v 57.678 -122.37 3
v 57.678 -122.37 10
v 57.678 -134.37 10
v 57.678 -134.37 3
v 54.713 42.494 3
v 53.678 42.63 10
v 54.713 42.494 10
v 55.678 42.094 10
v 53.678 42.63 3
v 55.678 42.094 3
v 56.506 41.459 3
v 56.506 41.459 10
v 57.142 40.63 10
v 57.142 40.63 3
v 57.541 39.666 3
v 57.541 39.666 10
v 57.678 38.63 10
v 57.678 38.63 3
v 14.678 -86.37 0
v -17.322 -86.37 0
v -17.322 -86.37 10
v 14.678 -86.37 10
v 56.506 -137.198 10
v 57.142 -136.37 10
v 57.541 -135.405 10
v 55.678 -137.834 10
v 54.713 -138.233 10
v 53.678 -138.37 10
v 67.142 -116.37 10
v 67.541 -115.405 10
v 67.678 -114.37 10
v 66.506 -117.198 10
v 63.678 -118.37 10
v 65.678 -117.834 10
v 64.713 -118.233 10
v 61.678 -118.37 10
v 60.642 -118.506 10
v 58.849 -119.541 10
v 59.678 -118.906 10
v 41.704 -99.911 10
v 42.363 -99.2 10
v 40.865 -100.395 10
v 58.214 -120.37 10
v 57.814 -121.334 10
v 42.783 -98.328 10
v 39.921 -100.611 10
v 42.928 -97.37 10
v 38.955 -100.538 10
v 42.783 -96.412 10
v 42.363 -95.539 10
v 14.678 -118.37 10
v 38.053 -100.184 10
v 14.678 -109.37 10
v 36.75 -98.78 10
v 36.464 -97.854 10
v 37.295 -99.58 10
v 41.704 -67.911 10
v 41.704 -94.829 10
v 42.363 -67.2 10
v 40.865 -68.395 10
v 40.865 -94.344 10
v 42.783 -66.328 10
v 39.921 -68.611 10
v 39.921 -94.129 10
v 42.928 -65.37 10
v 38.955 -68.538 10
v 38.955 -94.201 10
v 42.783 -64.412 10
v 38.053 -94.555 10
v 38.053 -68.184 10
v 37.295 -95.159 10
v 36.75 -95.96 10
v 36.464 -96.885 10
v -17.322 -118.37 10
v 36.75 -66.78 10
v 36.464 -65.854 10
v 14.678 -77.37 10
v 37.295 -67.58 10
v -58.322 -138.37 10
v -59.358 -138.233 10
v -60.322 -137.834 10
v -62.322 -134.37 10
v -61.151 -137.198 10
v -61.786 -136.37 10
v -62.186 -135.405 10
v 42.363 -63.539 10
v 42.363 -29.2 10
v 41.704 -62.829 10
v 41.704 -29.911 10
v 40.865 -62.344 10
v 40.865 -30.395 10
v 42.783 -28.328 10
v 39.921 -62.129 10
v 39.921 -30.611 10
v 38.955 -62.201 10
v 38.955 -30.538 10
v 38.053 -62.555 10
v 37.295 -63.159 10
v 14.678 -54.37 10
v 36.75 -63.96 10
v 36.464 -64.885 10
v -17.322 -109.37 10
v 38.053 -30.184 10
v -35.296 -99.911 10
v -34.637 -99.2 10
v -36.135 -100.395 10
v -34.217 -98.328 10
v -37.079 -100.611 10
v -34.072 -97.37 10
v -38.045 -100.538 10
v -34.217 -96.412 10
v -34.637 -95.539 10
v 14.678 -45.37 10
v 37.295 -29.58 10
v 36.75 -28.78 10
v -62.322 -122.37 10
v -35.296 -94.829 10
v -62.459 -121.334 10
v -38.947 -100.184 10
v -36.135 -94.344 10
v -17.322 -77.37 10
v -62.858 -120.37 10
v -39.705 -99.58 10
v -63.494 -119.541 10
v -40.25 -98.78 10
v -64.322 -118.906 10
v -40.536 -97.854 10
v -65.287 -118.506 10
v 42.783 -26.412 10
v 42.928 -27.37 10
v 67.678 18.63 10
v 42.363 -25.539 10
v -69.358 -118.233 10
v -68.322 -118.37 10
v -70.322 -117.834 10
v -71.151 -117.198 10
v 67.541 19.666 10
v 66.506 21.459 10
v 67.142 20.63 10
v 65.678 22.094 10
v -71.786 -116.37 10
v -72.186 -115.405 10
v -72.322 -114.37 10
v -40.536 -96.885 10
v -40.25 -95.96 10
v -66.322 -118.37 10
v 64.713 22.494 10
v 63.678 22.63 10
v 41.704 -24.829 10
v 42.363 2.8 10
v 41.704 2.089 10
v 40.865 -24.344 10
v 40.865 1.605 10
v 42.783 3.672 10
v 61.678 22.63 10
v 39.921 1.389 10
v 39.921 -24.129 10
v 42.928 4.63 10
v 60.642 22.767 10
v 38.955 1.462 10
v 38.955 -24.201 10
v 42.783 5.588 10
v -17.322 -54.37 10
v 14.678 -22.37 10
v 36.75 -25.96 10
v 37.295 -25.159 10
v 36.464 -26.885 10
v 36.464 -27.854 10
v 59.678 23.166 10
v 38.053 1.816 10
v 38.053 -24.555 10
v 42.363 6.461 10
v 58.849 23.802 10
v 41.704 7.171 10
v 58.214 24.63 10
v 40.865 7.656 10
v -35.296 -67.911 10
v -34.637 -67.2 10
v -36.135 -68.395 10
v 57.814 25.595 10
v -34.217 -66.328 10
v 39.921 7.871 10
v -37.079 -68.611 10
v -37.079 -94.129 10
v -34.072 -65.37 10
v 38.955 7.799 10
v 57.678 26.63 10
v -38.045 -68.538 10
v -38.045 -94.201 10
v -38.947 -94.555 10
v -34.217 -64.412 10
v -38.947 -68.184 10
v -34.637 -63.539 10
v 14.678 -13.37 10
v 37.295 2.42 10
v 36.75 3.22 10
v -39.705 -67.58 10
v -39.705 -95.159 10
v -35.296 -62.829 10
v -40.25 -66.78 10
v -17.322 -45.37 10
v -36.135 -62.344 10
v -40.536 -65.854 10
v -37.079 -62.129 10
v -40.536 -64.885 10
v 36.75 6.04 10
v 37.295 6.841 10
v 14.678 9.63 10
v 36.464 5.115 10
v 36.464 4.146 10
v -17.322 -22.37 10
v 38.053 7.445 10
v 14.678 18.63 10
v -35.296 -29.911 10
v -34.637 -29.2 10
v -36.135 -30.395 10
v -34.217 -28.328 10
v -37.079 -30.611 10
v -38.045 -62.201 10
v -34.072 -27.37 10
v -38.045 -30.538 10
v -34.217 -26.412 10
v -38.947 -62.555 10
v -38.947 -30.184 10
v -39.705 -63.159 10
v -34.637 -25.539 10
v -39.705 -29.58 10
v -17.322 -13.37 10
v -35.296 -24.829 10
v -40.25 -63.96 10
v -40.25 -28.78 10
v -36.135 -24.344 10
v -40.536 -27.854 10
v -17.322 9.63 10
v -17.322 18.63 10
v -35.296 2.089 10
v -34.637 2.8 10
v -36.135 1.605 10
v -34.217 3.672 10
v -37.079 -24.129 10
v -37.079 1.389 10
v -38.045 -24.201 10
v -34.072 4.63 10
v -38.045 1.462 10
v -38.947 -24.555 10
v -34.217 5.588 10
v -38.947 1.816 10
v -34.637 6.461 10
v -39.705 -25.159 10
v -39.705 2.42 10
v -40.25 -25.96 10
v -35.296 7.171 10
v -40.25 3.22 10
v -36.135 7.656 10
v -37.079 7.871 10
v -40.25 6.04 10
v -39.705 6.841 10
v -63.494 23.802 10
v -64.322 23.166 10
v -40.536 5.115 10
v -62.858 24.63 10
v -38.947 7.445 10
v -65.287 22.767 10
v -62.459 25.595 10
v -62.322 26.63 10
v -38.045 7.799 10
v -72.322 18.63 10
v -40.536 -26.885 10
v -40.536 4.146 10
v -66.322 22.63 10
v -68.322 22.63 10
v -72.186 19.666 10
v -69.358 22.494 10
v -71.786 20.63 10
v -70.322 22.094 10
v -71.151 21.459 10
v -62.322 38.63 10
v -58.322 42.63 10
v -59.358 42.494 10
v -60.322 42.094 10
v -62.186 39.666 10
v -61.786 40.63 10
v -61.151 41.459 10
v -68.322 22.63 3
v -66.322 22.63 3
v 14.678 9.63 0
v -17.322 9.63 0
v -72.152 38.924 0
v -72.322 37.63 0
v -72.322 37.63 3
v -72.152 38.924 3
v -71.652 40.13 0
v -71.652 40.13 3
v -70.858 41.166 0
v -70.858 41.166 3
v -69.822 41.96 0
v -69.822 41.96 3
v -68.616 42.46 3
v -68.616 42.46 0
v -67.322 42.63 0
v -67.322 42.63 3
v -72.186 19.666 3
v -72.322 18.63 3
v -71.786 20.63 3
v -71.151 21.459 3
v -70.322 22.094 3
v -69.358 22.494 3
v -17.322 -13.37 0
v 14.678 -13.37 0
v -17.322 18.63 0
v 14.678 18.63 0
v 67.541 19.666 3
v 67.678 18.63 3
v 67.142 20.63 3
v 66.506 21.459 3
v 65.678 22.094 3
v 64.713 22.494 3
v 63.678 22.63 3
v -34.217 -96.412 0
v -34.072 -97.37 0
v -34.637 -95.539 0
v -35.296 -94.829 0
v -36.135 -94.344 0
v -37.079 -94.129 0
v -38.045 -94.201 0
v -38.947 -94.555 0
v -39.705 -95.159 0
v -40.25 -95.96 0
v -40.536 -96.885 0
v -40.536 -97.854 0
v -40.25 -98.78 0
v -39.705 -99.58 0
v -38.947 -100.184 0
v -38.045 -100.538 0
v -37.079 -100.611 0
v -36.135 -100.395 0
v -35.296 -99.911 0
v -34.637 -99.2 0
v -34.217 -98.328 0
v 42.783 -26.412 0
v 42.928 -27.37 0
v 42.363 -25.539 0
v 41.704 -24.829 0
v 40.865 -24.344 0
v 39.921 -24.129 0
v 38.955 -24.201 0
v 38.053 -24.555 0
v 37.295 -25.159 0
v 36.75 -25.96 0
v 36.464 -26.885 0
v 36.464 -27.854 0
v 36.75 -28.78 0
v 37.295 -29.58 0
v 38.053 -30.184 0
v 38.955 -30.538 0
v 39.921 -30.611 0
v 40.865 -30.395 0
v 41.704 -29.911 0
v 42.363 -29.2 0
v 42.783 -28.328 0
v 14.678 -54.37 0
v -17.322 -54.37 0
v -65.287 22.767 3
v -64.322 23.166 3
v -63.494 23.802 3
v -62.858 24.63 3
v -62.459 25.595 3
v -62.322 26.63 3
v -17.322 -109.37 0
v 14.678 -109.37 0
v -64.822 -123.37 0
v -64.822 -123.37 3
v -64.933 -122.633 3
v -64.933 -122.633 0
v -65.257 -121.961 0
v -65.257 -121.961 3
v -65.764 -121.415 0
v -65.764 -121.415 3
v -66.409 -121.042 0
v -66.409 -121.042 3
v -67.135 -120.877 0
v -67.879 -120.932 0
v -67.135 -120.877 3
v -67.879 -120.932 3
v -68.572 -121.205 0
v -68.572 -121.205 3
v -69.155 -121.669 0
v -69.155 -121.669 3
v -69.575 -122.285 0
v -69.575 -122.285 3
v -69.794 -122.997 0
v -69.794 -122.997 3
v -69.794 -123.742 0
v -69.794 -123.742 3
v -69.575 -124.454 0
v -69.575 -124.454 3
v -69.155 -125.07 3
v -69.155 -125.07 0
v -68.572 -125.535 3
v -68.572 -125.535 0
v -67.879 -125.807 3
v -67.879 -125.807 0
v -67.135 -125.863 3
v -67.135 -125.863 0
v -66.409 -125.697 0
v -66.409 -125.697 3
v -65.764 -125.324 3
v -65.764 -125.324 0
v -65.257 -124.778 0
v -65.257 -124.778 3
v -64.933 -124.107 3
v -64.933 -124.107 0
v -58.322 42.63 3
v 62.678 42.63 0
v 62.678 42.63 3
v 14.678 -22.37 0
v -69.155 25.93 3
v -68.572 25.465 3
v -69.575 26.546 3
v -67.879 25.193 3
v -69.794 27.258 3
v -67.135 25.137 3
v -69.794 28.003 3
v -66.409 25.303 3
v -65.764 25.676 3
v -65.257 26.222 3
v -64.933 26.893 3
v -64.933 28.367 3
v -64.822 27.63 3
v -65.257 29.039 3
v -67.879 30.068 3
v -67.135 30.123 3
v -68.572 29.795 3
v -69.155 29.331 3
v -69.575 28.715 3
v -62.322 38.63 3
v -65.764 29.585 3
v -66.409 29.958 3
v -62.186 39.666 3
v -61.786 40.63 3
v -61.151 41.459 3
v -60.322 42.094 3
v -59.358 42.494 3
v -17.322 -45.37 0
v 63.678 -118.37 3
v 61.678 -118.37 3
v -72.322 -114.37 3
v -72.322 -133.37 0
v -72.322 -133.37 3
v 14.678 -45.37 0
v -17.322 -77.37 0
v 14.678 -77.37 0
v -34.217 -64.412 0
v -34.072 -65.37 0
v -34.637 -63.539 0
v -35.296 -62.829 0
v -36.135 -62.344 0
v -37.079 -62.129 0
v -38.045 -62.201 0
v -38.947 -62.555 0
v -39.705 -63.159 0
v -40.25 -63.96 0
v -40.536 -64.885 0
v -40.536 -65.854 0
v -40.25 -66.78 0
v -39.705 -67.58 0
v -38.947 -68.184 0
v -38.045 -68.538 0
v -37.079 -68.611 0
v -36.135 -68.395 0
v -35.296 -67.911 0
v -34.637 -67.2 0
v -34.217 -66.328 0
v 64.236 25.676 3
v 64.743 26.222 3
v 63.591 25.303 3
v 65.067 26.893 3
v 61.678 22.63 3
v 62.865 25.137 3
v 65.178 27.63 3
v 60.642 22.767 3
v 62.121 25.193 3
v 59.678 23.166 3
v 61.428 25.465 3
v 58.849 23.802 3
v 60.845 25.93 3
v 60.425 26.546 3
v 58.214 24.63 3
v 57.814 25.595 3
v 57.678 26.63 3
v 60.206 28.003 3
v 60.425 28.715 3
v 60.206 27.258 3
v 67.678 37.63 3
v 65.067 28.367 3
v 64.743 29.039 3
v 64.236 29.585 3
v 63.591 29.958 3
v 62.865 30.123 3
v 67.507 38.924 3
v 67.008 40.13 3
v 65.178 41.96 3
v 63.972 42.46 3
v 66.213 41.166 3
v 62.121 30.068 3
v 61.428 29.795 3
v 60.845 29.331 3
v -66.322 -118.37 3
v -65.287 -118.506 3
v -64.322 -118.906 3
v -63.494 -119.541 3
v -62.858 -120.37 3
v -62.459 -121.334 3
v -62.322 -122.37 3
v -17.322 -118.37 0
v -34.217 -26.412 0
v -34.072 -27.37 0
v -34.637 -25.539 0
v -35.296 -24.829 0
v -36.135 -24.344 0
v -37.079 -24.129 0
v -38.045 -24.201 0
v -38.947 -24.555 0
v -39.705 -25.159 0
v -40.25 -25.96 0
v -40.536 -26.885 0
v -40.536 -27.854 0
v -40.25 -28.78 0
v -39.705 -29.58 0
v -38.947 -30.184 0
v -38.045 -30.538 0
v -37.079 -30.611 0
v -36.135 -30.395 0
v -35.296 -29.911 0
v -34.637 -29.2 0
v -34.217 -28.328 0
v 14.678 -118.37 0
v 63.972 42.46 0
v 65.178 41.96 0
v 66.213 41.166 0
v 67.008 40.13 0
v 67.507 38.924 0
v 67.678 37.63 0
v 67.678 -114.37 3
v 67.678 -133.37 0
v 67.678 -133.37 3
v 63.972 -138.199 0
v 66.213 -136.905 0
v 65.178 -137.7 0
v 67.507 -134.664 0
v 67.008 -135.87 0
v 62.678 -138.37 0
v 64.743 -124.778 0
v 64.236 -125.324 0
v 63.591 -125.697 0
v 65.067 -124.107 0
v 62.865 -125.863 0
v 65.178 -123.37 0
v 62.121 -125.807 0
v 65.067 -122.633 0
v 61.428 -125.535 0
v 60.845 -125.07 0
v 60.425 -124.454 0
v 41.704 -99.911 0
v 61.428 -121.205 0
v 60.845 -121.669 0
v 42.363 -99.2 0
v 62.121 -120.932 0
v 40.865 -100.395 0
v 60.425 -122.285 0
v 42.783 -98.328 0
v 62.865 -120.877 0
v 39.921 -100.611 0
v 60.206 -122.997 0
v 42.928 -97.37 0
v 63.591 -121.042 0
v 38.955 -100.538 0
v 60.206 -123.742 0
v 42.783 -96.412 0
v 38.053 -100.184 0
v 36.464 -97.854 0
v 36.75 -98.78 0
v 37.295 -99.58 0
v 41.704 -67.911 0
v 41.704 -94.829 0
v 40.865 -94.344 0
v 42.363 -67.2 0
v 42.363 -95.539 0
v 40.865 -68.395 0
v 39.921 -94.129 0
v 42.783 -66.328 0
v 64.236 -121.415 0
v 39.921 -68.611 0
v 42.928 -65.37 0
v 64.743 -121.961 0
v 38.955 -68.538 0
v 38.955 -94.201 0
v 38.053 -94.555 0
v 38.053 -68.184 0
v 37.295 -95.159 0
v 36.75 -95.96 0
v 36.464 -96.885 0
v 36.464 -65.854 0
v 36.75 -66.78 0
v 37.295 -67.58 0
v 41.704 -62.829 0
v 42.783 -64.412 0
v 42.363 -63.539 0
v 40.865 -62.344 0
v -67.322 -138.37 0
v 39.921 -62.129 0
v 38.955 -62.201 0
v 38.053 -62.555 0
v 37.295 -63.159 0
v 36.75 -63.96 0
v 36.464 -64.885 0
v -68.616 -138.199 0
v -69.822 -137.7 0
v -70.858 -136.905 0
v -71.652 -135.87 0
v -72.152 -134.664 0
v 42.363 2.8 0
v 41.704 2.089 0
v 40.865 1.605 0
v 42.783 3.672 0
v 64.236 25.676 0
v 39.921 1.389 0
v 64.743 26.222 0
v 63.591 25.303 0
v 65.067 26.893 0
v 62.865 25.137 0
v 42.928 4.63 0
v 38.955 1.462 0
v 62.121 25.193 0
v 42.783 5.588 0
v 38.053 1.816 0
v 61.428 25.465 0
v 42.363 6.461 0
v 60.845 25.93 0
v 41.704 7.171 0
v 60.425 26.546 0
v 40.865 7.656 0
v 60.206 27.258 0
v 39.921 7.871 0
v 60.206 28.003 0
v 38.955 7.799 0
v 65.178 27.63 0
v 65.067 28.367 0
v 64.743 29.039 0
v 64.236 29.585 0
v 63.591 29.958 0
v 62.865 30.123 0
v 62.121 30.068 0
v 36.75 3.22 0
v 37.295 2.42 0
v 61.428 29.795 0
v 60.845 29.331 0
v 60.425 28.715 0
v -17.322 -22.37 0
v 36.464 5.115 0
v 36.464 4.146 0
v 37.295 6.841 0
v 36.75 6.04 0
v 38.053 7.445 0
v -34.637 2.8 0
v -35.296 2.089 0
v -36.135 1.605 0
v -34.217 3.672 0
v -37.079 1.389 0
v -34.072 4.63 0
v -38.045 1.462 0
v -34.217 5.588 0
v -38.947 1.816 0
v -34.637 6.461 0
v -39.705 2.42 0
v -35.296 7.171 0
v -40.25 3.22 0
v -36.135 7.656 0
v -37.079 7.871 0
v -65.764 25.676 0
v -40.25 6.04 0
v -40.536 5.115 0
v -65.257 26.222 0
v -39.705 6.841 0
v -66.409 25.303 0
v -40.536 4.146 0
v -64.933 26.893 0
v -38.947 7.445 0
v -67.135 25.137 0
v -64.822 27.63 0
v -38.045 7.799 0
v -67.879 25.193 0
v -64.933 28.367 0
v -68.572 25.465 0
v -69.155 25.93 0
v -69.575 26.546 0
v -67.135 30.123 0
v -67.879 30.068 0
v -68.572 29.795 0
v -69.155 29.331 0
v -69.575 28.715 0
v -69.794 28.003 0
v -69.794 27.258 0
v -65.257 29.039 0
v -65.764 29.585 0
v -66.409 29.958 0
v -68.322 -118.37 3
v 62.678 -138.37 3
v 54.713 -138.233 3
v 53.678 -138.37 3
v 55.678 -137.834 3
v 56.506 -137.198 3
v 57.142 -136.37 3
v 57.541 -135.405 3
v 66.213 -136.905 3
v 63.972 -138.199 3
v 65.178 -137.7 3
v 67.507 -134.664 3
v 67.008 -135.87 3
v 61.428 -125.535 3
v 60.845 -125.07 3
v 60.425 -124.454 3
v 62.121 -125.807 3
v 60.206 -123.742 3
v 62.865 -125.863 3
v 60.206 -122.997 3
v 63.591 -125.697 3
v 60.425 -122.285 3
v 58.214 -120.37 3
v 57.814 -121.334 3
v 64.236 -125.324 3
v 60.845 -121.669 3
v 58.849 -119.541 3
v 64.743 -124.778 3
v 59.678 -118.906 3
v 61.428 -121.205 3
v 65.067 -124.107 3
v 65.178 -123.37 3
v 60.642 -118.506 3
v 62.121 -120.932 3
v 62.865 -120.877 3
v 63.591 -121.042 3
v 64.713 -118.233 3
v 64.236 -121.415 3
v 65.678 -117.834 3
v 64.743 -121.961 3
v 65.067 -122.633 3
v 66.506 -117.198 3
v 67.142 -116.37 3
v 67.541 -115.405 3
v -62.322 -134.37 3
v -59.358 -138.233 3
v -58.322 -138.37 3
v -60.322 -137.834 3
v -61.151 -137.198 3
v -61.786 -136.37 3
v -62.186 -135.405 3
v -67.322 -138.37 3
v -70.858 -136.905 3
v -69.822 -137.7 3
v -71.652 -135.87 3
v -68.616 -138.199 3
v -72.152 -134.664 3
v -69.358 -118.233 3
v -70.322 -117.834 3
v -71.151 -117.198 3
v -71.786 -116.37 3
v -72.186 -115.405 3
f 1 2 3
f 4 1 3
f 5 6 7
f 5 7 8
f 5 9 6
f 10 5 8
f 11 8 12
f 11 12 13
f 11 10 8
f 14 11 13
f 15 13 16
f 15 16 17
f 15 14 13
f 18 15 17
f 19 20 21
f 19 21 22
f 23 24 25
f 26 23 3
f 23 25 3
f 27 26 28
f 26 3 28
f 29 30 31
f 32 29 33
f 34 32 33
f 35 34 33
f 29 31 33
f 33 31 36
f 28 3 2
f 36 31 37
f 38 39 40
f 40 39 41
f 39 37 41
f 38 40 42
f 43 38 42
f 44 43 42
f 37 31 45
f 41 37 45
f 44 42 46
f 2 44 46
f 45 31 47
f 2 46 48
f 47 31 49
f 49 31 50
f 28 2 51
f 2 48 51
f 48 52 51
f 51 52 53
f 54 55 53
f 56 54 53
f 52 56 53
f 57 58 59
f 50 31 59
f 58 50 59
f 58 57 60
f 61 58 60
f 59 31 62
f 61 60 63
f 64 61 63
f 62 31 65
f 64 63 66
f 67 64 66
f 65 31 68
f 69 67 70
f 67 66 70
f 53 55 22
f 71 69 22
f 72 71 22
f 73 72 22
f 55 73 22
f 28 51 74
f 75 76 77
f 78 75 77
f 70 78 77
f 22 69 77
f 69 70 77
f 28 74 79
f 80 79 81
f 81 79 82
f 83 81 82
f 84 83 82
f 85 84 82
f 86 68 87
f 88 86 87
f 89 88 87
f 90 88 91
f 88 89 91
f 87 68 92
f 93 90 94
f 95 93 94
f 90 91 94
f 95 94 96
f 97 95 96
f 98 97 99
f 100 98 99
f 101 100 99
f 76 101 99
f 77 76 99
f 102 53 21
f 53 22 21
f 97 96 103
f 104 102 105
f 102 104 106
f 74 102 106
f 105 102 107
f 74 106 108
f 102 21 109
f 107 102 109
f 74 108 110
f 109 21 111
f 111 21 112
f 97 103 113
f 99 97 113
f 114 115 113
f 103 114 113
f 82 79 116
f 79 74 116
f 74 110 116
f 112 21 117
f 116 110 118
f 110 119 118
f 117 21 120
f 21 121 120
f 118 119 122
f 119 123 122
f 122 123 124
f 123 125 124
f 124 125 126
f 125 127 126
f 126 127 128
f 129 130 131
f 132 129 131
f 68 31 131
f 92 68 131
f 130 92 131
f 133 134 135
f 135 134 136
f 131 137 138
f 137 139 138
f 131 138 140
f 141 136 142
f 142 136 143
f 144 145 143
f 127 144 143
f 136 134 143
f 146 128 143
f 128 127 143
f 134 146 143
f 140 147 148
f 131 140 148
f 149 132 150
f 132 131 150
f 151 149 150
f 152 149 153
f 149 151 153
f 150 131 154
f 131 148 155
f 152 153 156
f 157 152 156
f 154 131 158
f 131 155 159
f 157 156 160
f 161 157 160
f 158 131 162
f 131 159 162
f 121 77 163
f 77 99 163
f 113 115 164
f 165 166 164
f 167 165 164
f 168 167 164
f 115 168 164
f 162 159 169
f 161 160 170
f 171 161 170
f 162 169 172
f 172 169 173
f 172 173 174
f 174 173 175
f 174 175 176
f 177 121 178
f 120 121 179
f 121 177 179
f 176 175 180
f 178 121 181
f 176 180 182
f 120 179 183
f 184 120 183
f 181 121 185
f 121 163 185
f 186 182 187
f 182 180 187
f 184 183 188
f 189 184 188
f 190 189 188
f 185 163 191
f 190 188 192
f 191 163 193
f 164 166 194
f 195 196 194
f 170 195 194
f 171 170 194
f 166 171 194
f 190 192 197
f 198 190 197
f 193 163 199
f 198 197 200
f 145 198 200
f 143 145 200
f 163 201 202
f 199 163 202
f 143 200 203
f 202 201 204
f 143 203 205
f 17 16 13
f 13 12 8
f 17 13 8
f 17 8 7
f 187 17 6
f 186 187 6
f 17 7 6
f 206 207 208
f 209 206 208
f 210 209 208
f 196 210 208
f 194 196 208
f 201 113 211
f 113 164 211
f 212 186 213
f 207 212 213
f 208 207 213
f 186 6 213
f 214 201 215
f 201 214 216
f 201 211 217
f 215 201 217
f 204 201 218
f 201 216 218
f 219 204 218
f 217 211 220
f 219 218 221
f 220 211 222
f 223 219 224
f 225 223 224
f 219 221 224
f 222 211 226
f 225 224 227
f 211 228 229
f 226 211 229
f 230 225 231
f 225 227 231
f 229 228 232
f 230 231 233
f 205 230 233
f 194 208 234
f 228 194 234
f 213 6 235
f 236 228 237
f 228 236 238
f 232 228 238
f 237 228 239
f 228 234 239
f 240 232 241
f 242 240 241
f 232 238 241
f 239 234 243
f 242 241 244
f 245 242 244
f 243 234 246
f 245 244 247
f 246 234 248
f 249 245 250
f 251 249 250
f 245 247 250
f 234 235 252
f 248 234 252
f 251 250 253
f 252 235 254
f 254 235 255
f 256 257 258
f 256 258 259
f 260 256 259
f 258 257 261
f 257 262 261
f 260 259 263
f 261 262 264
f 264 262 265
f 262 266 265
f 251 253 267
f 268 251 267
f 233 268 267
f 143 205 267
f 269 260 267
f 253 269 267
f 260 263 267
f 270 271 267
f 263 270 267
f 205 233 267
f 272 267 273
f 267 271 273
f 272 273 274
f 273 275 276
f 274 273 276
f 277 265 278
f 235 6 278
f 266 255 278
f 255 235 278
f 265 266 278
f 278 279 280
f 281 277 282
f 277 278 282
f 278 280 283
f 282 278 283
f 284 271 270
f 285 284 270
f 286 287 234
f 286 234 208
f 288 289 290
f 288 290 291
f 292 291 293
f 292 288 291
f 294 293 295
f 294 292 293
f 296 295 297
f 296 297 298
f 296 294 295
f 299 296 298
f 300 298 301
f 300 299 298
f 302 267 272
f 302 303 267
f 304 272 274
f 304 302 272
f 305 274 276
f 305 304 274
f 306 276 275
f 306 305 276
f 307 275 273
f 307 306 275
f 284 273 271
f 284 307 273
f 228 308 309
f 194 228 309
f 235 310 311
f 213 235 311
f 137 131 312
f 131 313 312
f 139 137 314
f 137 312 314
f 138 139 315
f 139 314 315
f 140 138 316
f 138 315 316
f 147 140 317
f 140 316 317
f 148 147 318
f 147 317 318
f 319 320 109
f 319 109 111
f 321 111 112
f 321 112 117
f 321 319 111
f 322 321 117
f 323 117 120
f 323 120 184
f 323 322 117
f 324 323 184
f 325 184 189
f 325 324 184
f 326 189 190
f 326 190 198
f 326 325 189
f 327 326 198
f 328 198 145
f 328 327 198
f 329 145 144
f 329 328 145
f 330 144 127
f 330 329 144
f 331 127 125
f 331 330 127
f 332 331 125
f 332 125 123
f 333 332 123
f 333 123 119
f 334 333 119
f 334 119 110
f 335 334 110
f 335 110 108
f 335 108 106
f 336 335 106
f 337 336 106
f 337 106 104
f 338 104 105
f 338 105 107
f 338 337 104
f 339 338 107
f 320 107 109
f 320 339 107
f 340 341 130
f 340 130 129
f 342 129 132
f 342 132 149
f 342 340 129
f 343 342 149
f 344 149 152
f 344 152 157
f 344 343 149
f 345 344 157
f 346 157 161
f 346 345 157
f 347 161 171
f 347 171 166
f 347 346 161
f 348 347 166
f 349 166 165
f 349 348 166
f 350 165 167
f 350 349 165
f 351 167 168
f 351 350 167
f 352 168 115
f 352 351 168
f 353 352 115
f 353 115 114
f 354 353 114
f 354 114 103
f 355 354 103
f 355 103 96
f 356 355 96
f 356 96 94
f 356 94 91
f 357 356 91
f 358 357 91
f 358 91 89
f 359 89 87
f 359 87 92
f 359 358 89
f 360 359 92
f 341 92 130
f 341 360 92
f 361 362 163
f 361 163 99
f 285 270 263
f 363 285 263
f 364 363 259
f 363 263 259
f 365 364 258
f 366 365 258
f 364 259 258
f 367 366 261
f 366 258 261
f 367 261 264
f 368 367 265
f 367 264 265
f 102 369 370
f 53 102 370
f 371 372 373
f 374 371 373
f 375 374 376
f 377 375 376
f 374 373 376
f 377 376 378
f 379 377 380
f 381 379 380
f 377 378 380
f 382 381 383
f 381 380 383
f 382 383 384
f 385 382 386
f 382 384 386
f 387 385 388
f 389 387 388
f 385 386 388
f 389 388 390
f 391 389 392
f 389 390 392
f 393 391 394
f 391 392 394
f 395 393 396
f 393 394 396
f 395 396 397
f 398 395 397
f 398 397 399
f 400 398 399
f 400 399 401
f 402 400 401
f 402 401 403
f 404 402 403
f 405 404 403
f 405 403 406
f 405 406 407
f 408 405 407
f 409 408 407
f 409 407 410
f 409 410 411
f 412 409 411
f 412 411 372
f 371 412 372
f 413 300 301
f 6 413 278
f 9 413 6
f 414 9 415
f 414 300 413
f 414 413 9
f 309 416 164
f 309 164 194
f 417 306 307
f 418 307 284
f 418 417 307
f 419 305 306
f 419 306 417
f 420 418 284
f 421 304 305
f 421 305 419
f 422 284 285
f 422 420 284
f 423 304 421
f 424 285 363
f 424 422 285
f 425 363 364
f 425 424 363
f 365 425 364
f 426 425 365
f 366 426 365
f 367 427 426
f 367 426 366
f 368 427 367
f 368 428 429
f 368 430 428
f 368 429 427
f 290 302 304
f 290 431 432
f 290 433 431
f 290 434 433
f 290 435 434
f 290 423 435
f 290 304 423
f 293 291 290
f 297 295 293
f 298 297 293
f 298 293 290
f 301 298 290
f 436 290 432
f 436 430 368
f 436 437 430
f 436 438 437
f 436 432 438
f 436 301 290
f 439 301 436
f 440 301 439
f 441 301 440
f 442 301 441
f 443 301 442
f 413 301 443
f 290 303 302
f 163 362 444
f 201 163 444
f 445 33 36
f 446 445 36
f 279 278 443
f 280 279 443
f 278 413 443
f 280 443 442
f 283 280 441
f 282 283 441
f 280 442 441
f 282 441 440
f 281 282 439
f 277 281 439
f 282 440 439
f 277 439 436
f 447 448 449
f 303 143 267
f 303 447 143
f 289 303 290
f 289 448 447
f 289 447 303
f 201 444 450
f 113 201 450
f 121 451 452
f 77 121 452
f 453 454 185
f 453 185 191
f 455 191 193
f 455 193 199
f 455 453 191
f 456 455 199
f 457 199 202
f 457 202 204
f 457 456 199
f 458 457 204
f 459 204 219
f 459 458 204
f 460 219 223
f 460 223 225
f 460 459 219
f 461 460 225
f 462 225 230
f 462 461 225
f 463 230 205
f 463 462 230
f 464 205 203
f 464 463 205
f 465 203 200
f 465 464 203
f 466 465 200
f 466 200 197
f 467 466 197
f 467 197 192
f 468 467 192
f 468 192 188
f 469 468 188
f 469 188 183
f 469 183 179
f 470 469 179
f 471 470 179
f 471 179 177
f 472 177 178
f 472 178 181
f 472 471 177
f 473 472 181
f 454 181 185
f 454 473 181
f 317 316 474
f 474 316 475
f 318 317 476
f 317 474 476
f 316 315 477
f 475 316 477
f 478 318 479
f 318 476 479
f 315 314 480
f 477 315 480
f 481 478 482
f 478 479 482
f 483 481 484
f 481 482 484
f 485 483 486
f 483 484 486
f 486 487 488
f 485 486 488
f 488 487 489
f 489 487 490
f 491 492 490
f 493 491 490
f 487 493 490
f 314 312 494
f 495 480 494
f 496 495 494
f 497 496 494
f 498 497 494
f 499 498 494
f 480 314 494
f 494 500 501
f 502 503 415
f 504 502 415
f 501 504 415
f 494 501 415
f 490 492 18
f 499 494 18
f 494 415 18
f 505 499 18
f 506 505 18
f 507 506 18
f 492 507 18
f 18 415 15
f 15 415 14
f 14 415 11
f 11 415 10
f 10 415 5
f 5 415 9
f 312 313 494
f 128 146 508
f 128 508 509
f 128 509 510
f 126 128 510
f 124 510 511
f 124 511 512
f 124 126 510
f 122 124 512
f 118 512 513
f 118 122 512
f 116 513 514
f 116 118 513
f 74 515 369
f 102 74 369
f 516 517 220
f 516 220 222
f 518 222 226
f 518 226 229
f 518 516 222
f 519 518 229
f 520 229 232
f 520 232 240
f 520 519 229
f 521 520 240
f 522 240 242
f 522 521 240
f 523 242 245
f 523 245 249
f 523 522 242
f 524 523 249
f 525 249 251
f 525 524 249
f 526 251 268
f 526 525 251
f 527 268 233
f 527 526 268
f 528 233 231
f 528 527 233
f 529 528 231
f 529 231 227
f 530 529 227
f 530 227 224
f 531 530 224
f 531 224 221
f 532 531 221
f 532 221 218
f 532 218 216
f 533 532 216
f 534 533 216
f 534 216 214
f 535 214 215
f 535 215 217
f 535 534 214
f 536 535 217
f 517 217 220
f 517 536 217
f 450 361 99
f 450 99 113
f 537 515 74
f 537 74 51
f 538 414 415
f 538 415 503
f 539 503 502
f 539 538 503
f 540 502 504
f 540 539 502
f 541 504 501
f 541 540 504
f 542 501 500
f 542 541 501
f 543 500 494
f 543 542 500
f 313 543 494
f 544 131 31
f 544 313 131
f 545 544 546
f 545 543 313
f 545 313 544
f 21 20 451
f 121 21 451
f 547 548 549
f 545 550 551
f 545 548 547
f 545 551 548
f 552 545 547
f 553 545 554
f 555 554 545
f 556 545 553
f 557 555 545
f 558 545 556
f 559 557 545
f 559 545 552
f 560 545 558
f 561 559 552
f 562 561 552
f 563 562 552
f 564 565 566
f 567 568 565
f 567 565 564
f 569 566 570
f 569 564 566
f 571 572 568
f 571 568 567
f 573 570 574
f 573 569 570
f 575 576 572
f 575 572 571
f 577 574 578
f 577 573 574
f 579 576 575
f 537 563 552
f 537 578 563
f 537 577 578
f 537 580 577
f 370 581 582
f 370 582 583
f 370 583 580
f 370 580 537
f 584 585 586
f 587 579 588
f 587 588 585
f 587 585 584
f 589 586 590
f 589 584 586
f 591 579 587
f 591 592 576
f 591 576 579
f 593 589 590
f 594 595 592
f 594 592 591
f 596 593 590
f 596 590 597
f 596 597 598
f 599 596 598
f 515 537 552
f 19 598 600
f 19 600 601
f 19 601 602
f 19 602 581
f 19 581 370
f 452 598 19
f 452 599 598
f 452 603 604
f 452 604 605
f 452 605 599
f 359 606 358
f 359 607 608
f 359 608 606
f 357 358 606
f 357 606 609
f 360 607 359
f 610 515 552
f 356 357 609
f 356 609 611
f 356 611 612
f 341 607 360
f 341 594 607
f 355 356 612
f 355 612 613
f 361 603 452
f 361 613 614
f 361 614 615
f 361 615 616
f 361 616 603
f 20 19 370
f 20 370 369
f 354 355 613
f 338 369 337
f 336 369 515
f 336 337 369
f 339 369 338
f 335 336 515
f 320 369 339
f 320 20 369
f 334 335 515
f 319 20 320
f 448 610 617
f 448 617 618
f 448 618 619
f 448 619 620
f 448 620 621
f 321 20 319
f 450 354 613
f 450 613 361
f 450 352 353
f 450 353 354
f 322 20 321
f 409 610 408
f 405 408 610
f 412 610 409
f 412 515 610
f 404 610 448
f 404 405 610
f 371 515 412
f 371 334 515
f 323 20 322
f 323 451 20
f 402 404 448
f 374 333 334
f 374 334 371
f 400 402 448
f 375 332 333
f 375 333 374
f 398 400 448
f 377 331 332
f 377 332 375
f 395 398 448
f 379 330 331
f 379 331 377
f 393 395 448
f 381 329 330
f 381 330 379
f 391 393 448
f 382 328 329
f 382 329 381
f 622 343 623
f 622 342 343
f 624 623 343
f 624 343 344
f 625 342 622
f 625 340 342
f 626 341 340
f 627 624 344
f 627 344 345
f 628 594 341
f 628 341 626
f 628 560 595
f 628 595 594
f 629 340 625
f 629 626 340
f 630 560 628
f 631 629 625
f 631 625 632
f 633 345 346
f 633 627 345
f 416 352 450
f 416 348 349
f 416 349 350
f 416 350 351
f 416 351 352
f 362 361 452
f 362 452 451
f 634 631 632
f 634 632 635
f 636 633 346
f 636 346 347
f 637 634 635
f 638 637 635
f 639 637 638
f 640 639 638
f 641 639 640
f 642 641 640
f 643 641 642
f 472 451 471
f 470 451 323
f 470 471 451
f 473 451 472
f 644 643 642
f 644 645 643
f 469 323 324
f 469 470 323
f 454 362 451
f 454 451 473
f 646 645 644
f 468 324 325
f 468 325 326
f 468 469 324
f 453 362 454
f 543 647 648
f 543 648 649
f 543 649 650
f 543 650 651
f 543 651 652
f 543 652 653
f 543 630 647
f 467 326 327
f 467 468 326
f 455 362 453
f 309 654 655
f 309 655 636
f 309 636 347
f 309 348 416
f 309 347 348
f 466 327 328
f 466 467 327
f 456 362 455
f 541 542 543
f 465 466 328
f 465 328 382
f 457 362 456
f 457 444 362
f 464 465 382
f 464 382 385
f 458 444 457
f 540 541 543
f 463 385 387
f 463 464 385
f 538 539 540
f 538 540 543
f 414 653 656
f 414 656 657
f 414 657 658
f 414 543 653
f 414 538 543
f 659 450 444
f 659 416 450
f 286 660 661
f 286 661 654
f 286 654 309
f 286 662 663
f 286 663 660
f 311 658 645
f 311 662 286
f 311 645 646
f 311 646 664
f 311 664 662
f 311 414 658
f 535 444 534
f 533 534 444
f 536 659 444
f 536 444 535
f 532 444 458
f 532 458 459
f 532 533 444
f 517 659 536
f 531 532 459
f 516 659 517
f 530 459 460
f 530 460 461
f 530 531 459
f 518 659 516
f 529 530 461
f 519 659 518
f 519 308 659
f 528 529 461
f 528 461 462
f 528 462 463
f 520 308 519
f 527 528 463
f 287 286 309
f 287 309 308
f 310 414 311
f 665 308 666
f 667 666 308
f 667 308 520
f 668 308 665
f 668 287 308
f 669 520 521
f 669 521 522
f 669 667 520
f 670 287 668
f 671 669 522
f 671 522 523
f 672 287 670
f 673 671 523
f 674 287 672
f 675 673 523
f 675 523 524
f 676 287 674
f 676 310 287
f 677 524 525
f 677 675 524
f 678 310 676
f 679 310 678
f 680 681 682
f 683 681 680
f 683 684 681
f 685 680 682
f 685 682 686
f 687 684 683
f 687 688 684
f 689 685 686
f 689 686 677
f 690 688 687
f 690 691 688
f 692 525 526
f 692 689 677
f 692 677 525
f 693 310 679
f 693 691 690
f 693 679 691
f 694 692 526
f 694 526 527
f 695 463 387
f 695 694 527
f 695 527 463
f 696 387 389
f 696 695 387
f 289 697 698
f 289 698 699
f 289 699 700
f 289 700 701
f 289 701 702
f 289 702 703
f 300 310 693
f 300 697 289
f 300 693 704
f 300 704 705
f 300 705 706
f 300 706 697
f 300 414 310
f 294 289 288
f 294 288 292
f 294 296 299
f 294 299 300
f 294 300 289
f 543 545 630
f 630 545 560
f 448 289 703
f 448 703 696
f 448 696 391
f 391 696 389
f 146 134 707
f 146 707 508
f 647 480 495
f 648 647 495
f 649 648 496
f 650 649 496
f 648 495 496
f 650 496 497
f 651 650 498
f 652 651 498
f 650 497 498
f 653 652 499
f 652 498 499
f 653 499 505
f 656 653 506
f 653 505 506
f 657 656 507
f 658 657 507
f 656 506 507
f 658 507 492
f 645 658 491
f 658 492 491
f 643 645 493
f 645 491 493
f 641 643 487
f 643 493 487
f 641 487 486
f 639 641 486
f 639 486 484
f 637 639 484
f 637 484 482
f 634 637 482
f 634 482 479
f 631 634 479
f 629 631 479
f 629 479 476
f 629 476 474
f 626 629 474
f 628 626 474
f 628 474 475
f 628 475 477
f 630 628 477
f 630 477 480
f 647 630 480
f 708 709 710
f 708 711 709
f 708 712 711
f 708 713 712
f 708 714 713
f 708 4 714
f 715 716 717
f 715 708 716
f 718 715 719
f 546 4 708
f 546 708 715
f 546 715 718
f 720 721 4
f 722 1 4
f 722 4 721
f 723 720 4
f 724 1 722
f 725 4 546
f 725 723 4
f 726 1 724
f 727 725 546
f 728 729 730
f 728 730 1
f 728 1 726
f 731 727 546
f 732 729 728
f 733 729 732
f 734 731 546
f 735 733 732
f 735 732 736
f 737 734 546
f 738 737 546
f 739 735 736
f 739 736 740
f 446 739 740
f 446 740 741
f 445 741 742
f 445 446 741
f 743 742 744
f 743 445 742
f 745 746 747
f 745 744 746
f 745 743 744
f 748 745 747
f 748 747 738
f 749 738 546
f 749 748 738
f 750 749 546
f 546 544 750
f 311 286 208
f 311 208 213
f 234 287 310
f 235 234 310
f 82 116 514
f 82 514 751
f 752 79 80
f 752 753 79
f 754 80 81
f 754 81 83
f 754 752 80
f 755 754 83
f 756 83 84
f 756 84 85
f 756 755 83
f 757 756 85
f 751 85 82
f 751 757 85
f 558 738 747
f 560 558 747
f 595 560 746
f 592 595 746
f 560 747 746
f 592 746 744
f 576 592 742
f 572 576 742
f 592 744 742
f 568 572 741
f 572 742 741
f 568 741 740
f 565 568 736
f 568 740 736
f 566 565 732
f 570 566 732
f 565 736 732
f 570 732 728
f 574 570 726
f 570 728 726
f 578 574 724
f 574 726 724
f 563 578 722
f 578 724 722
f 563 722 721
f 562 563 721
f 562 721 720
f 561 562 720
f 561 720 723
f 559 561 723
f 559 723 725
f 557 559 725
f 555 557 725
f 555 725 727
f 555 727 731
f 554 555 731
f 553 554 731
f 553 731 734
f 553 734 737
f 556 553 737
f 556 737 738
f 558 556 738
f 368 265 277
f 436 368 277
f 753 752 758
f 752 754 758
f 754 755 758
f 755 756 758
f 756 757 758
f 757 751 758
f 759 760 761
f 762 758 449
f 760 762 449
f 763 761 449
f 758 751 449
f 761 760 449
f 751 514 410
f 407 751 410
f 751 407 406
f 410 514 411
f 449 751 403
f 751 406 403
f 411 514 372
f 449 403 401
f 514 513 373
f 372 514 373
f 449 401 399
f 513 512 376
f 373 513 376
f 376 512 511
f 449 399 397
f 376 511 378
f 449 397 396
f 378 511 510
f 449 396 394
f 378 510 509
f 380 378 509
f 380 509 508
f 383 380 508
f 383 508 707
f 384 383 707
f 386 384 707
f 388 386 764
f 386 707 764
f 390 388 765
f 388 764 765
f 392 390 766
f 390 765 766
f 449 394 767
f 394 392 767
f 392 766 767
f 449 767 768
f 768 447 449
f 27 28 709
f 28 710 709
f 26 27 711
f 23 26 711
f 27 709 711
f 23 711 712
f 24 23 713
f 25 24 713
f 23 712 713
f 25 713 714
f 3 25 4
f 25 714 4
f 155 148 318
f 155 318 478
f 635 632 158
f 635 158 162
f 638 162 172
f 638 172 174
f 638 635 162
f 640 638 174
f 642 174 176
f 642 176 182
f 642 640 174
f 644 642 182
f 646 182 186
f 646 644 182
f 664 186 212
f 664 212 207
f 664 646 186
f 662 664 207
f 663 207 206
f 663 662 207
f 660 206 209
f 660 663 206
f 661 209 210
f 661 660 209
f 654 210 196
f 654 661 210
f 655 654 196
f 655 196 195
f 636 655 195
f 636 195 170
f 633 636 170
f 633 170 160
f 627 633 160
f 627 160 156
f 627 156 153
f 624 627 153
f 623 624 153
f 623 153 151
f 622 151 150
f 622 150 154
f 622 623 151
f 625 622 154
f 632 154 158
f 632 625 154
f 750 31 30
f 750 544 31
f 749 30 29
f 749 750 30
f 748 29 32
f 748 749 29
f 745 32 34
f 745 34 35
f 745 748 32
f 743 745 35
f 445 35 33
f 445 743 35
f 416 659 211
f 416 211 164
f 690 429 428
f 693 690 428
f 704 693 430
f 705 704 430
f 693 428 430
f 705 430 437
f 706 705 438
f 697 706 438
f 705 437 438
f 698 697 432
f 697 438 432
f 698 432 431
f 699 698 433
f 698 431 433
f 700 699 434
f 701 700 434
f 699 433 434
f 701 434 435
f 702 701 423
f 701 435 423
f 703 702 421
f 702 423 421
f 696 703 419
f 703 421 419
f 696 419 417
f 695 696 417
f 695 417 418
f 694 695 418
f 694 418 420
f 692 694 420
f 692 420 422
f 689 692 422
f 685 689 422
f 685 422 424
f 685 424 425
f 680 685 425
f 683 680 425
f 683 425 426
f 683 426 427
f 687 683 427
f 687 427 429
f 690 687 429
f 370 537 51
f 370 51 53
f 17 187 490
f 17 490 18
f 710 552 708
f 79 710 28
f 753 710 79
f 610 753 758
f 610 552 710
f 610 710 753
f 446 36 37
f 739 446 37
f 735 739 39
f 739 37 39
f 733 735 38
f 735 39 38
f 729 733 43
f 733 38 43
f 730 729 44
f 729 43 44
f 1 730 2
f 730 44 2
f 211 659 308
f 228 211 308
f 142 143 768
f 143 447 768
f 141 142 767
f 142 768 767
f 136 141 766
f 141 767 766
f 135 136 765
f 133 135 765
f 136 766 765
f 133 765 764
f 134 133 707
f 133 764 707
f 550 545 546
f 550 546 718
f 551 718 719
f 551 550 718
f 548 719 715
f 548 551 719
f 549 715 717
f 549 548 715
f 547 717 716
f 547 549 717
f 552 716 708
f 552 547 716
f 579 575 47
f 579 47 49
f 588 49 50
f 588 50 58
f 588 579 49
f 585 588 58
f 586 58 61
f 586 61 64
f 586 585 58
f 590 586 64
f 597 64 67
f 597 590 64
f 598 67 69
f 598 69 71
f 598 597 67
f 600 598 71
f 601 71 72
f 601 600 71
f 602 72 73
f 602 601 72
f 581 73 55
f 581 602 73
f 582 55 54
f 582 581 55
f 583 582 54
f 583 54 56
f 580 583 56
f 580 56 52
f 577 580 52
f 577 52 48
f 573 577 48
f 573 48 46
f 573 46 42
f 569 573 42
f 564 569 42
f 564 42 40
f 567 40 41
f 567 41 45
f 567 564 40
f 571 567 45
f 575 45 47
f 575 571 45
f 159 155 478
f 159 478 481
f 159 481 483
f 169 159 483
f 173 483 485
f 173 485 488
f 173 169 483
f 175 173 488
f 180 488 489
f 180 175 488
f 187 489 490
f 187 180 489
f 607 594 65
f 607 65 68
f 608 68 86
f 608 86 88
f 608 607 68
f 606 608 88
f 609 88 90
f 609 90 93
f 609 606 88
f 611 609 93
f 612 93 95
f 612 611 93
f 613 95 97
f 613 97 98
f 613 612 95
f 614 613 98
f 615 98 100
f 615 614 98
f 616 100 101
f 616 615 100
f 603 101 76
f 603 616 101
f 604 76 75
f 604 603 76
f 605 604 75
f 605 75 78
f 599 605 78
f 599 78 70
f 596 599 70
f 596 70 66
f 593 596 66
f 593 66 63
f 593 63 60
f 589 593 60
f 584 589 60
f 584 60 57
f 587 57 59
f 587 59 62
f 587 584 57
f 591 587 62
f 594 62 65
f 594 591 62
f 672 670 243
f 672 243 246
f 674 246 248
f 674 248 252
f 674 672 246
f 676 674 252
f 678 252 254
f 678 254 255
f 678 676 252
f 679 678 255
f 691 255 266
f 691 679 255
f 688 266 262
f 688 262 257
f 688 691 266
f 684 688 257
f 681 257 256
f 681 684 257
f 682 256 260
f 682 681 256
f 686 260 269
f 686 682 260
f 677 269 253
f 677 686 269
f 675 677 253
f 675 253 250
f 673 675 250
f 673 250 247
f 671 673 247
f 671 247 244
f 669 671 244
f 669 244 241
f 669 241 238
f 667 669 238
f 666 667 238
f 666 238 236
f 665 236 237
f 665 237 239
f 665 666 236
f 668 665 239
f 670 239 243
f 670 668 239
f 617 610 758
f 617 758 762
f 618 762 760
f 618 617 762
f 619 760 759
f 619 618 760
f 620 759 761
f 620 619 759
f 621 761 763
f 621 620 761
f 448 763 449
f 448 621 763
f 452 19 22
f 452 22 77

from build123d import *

# Parameters (mm, degrees)
SKETCH1_R           = 3.25
SKETCH1_W           = 32
SKETCH1_H           = 9
BOSS_EXTRUDE1_DEPTH = 10
CUT_EXTRUDE1_DEPTH  = 7
SKETCH3_R           = 2.5
CUT_EXTRUDE2_DEPTH  = 10
FILLET1_R           = 4


with BuildPart() as part:
    # Sketch1 → Boss-Extrude1 (new body)
    with BuildSketch(Plane.XY):
        with BuildLine():
            Line((-67.322274882, 42.630331754), (62.677725118, 42.630331754))
            ThreePointArc((62.677725118, 42.630331754), (66.213259024, 41.165865659), (67.677725118, 37.630331754))
            Line((67.677725118, 37.630331754), (67.677725118, -133.369668246))
            ThreePointArc((67.677725118, -133.369668246), (66.213259024, -136.905202152), (62.677725118, -138.369668246))
            Line((62.677725118, -138.369668246), (-67.322274882, -138.369668246))
            ThreePointArc((-67.322274882, -138.369668246), (-70.857808787, -136.905202152), (-72.322274882, -133.369668246))
            Line((-72.322274882, -133.369668246), (-72.322274882, 37.630331754))
            ThreePointArc((-72.322274882, 37.630331754), (-70.857808787, 41.165865659), (-67.322274882, 42.630331754))
        make_face()
        with Locations((-37.322274882, 4.630331754)):
            Circle(SKETCH1_R, mode=Mode.SUBTRACT)
        with Locations((-37.322274882, -27.369668246)):
            Circle(SKETCH1_R, mode=Mode.SUBTRACT)
        with Locations((-37.322274882, -65.369668246)):
            Circle(SKETCH1_R, mode=Mode.SUBTRACT)
        with Locations((-37.322274882, -97.369668246)):
            Circle(SKETCH1_R, mode=Mode.SUBTRACT)
        with Locations((39.677725118, 4.630331754)):
            Circle(SKETCH1_R, mode=Mode.SUBTRACT)
        with Locations((39.677725118, -27.369668246)):
            Circle(SKETCH1_R, mode=Mode.SUBTRACT)
        with Locations((39.677725118, -65.369668246)):
            Circle(SKETCH1_R, mode=Mode.SUBTRACT)
        with Locations((39.677725118, -97.369668246)):
            Circle(SKETCH1_R, mode=Mode.SUBTRACT)
        with Locations((-1.322274882, 14.130331754)):
            Rectangle(SKETCH1_W, SKETCH1_H, mode=Mode.SUBTRACT)
        with Locations((-1.322274882, -17.869668246)):
            Rectangle(SKETCH1_W, SKETCH1_H, mode=Mode.SUBTRACT)
        with Locations((-1.322274882, -49.869668246)):
            Rectangle(SKETCH1_W, SKETCH1_H, mode=Mode.SUBTRACT)
        with Locations((-1.322274882, -81.869668246)):
            Rectangle(SKETCH1_W, SKETCH1_H, mode=Mode.SUBTRACT)
        with Locations((-1.322274882, -113.869668246)):
            Rectangle(SKETCH1_W, SKETCH1_H, mode=Mode.SUBTRACT)
    extrude(amount=BOSS_EXTRUDE1_DEPTH)

    # Sketch2 → Cut-Extrude1 (cut)
    with BuildSketch(Plane.XY.offset(10)):
        with BuildLine():
            Line((-62.322274882, 42.630331754), (-72.322274882, 42.630331754))
            Line((-72.322274882, 42.630331754), (-72.322274882, 22.630331754))
            Line((-72.322274882, 22.630331754), (-66.322274882, 22.630331754))
            ThreePointArc((-66.322274882, 22.630331754), (-63.493847757, 23.801904629), (-62.322274882, 26.630331754))
            Line((-62.322274882, 26.630331754), (-62.322274882, 42.630331754))
        make_face()
        with BuildLine():
            Line((-72.322274882, -118.369668246), (-66.322274882, -118.369668246))
            ThreePointArc((-66.322274882, -118.369668246), (-63.493847757, -119.541241122), (-62.322274882, -122.369668246))
            Line((-62.322274882, -122.369668246), (-62.322274882, -138.369668246))
            Line((-62.322274882, -138.369668246), (-72.322274882, -138.369668246))
            Line((-72.322274882, -138.369668246), (-72.322274882, -118.369668246))
        make_face()
        with BuildLine():
            Line((57.677725118, -138.369668246), (67.677725118, -138.369668246))
            Line((67.677725118, -138.369668246), (67.677725118, -118.369668246))
            Line((67.677725118, -118.369668246), (61.677725118, -118.369668246))
            ThreePointArc((61.677725118, -118.369668246), (58.849297994, -119.541241122), (57.677725118, -122.369668246))
            Line((57.677725118, -122.369668246), (57.677725118, -138.369668246))
        make_face()
        with BuildLine():
            Line((67.677725118, 22.630331754), (61.677725118, 22.630331754))
            ThreePointArc((61.677725118, 22.630331754), (58.849297994, 23.801904629), (57.677725118, 26.630331754))
            Line((57.677725118, 26.630331754), (57.677725118, 42.630331754))
            Line((57.677725118, 42.630331754), (67.677725118, 42.630331754))
            Line((67.677725118, 42.630331754), (67.677725118, 22.630331754))
        make_face()
    extrude(amount=-CUT_EXTRUDE1_DEPTH, mode=Mode.SUBTRACT)

    # Sketch3 → Cut-Extrude2 (cut)
    with BuildSketch(Plane.XY.offset(3)):
        with Locations((-67.322274882, -123.369668246)):
            Circle(SKETCH3_R)
        with Locations((62.677725118, -123.369668246)):
            Circle(SKETCH3_R)
        with Locations((62.677725118, 27.630331754)):
            Circle(SKETCH3_R)
        with Locations((-67.322274882, 27.630331754)):
            Circle(SKETCH3_R)
    extrude(amount=-CUT_EXTRUDE2_DEPTH, mode=Mode.SUBTRACT)

    # Fillet1
    fillet1_edges = [part.edges().sort_by_distance(p)[0] for p in [
        (57.677725118, 42.630331754, 6.5),
        (67.677725118, 22.630331754, 6.5),
        (67.677725118, -118.369668246, 6.5),
        (57.677725118, -138.369668246, 6.5),
        (-62.322274882, -138.369668246, 6.5),
        (-72.322274882, -118.369668246, 6.5),
        (-72.322274882, 22.630331754, 6.5),
        (-62.322274882, 42.630331754, 6.5),
    ]]
    fillet(fillet1_edges, radius=FILLET1_R)


solid = part.part
